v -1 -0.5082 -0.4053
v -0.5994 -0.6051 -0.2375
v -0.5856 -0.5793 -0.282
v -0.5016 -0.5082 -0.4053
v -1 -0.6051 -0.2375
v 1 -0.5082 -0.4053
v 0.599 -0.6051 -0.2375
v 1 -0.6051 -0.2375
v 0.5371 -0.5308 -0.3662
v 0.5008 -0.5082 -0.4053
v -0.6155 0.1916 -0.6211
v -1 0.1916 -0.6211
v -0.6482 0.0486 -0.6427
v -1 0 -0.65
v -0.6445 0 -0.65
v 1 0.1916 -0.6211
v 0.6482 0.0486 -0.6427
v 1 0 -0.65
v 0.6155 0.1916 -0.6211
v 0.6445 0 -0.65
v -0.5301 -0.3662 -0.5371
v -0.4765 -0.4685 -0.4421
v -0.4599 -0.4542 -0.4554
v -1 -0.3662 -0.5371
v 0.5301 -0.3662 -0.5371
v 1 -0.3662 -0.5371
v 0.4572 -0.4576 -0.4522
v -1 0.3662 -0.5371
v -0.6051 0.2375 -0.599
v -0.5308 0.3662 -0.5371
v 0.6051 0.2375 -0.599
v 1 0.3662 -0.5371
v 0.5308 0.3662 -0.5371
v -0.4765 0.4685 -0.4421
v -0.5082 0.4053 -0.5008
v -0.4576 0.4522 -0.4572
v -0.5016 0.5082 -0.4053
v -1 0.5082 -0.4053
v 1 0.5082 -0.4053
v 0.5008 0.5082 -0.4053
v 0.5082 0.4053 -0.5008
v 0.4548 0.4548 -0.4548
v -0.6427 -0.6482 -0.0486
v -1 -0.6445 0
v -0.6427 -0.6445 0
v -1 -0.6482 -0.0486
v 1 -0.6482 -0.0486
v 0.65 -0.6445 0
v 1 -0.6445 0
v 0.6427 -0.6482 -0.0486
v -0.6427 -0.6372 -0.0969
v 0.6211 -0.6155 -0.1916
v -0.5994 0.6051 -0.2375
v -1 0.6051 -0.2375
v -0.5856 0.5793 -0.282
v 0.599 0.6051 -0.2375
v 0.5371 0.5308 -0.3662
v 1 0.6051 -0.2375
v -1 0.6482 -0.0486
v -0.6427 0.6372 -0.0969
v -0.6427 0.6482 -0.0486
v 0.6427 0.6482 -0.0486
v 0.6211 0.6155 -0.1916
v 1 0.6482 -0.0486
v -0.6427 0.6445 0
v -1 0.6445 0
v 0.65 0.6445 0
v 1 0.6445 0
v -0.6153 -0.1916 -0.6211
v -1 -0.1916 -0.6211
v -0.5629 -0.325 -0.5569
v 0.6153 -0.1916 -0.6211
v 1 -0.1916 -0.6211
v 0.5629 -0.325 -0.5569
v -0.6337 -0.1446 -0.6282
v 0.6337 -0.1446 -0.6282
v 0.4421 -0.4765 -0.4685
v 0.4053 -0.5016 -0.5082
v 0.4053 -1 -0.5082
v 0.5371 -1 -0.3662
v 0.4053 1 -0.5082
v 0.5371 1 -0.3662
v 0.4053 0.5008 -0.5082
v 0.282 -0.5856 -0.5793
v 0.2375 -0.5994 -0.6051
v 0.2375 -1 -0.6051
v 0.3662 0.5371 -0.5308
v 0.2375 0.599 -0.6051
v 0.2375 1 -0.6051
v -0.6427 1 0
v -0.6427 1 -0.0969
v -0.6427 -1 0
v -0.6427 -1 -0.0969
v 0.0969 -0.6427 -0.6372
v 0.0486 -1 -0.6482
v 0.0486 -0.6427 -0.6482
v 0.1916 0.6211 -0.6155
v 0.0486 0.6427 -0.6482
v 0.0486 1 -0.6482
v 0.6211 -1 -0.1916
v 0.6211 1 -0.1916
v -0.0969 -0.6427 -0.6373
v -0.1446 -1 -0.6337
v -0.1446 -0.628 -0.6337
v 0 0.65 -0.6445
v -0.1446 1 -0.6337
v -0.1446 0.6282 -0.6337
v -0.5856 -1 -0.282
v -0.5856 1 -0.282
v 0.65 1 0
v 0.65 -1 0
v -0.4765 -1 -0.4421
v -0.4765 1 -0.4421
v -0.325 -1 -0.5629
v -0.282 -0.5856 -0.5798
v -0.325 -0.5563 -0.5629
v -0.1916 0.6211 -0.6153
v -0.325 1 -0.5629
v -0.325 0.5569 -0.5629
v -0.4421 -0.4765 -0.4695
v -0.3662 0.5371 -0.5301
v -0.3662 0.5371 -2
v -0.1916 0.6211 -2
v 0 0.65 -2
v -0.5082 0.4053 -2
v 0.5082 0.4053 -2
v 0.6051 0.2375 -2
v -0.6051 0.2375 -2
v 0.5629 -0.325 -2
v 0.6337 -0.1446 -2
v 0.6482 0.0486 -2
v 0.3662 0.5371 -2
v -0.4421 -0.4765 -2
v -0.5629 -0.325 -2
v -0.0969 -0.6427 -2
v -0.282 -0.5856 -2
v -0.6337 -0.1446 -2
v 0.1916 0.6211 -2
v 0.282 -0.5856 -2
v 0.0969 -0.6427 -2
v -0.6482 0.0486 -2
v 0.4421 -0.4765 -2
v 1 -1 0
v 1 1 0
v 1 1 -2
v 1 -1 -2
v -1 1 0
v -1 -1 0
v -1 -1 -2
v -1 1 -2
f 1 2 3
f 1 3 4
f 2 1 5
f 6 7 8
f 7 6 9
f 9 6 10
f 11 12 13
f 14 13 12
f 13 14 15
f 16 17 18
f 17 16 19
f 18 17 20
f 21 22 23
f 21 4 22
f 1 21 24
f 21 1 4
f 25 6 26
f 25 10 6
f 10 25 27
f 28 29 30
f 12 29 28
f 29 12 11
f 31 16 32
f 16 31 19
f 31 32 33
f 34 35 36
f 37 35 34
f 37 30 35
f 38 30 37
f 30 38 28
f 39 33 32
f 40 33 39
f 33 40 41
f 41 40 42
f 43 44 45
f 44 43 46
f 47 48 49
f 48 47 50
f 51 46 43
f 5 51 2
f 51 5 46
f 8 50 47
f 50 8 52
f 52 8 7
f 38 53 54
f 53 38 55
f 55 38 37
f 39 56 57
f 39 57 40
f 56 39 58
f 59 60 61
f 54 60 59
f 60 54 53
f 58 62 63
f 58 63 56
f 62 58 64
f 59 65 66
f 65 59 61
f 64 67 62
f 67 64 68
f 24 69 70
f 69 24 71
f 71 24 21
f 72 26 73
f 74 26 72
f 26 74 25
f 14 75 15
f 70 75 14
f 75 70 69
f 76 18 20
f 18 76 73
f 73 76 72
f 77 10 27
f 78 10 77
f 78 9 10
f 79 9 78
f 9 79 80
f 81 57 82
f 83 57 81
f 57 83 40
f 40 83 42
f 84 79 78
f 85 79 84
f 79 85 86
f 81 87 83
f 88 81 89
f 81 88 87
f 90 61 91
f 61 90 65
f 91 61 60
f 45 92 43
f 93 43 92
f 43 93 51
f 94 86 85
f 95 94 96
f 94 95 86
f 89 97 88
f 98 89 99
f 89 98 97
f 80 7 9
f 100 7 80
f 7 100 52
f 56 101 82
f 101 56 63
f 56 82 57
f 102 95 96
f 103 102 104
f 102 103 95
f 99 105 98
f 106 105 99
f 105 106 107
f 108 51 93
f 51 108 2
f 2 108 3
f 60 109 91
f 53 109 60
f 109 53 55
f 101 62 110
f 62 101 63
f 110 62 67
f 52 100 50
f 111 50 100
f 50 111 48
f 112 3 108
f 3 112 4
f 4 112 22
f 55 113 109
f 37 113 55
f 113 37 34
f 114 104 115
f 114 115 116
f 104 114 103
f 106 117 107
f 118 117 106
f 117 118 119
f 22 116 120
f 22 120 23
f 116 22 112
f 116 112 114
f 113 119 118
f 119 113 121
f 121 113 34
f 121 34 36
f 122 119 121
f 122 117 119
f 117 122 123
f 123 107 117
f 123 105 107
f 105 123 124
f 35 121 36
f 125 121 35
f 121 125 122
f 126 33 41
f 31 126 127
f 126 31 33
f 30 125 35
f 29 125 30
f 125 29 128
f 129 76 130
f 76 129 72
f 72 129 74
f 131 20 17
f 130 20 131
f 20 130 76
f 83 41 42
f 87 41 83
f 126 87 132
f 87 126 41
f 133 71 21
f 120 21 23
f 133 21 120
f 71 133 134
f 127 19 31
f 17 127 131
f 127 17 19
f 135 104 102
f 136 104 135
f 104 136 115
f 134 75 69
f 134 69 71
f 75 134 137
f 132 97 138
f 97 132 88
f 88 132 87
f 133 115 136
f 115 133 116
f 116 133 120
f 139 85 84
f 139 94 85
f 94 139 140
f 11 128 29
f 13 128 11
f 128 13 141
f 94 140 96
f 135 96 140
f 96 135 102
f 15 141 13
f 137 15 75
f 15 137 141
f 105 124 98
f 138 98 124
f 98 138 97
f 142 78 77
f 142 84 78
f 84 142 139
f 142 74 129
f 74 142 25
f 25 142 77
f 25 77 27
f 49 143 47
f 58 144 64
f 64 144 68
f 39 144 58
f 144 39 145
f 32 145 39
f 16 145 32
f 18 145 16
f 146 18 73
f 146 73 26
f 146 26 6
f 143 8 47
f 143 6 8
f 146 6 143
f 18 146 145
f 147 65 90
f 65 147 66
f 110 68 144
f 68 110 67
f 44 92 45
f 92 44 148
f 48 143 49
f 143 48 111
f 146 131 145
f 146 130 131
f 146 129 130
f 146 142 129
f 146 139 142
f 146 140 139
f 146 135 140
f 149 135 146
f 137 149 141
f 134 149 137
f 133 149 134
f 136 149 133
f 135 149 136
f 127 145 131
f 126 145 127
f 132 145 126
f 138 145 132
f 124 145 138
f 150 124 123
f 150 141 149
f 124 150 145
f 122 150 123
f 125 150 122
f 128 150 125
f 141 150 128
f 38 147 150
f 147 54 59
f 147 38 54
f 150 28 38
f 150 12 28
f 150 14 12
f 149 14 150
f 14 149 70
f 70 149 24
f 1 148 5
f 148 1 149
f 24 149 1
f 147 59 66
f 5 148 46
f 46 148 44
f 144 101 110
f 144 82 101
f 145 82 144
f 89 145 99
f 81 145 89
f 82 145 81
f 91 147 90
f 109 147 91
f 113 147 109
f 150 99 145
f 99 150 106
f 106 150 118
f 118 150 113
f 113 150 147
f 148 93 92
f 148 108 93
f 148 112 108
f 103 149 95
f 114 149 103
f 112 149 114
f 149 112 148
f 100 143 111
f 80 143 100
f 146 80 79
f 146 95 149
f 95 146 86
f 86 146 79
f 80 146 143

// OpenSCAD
//stavka.scad

module stavka() {
     difference (){
      translate ([0, 0, -10]) cube ([20, 20, 20], center=true);
        union (){
               for (rot = [[0, 90, 0], [90, 0, 0], [0, 0, 90]]){ rotate(rot) cylinder(r= 6.5, h=50, fa = 20, center = true);}
     }
  }
}

scale([0.1, 0.1, 0.1]) stavka();
